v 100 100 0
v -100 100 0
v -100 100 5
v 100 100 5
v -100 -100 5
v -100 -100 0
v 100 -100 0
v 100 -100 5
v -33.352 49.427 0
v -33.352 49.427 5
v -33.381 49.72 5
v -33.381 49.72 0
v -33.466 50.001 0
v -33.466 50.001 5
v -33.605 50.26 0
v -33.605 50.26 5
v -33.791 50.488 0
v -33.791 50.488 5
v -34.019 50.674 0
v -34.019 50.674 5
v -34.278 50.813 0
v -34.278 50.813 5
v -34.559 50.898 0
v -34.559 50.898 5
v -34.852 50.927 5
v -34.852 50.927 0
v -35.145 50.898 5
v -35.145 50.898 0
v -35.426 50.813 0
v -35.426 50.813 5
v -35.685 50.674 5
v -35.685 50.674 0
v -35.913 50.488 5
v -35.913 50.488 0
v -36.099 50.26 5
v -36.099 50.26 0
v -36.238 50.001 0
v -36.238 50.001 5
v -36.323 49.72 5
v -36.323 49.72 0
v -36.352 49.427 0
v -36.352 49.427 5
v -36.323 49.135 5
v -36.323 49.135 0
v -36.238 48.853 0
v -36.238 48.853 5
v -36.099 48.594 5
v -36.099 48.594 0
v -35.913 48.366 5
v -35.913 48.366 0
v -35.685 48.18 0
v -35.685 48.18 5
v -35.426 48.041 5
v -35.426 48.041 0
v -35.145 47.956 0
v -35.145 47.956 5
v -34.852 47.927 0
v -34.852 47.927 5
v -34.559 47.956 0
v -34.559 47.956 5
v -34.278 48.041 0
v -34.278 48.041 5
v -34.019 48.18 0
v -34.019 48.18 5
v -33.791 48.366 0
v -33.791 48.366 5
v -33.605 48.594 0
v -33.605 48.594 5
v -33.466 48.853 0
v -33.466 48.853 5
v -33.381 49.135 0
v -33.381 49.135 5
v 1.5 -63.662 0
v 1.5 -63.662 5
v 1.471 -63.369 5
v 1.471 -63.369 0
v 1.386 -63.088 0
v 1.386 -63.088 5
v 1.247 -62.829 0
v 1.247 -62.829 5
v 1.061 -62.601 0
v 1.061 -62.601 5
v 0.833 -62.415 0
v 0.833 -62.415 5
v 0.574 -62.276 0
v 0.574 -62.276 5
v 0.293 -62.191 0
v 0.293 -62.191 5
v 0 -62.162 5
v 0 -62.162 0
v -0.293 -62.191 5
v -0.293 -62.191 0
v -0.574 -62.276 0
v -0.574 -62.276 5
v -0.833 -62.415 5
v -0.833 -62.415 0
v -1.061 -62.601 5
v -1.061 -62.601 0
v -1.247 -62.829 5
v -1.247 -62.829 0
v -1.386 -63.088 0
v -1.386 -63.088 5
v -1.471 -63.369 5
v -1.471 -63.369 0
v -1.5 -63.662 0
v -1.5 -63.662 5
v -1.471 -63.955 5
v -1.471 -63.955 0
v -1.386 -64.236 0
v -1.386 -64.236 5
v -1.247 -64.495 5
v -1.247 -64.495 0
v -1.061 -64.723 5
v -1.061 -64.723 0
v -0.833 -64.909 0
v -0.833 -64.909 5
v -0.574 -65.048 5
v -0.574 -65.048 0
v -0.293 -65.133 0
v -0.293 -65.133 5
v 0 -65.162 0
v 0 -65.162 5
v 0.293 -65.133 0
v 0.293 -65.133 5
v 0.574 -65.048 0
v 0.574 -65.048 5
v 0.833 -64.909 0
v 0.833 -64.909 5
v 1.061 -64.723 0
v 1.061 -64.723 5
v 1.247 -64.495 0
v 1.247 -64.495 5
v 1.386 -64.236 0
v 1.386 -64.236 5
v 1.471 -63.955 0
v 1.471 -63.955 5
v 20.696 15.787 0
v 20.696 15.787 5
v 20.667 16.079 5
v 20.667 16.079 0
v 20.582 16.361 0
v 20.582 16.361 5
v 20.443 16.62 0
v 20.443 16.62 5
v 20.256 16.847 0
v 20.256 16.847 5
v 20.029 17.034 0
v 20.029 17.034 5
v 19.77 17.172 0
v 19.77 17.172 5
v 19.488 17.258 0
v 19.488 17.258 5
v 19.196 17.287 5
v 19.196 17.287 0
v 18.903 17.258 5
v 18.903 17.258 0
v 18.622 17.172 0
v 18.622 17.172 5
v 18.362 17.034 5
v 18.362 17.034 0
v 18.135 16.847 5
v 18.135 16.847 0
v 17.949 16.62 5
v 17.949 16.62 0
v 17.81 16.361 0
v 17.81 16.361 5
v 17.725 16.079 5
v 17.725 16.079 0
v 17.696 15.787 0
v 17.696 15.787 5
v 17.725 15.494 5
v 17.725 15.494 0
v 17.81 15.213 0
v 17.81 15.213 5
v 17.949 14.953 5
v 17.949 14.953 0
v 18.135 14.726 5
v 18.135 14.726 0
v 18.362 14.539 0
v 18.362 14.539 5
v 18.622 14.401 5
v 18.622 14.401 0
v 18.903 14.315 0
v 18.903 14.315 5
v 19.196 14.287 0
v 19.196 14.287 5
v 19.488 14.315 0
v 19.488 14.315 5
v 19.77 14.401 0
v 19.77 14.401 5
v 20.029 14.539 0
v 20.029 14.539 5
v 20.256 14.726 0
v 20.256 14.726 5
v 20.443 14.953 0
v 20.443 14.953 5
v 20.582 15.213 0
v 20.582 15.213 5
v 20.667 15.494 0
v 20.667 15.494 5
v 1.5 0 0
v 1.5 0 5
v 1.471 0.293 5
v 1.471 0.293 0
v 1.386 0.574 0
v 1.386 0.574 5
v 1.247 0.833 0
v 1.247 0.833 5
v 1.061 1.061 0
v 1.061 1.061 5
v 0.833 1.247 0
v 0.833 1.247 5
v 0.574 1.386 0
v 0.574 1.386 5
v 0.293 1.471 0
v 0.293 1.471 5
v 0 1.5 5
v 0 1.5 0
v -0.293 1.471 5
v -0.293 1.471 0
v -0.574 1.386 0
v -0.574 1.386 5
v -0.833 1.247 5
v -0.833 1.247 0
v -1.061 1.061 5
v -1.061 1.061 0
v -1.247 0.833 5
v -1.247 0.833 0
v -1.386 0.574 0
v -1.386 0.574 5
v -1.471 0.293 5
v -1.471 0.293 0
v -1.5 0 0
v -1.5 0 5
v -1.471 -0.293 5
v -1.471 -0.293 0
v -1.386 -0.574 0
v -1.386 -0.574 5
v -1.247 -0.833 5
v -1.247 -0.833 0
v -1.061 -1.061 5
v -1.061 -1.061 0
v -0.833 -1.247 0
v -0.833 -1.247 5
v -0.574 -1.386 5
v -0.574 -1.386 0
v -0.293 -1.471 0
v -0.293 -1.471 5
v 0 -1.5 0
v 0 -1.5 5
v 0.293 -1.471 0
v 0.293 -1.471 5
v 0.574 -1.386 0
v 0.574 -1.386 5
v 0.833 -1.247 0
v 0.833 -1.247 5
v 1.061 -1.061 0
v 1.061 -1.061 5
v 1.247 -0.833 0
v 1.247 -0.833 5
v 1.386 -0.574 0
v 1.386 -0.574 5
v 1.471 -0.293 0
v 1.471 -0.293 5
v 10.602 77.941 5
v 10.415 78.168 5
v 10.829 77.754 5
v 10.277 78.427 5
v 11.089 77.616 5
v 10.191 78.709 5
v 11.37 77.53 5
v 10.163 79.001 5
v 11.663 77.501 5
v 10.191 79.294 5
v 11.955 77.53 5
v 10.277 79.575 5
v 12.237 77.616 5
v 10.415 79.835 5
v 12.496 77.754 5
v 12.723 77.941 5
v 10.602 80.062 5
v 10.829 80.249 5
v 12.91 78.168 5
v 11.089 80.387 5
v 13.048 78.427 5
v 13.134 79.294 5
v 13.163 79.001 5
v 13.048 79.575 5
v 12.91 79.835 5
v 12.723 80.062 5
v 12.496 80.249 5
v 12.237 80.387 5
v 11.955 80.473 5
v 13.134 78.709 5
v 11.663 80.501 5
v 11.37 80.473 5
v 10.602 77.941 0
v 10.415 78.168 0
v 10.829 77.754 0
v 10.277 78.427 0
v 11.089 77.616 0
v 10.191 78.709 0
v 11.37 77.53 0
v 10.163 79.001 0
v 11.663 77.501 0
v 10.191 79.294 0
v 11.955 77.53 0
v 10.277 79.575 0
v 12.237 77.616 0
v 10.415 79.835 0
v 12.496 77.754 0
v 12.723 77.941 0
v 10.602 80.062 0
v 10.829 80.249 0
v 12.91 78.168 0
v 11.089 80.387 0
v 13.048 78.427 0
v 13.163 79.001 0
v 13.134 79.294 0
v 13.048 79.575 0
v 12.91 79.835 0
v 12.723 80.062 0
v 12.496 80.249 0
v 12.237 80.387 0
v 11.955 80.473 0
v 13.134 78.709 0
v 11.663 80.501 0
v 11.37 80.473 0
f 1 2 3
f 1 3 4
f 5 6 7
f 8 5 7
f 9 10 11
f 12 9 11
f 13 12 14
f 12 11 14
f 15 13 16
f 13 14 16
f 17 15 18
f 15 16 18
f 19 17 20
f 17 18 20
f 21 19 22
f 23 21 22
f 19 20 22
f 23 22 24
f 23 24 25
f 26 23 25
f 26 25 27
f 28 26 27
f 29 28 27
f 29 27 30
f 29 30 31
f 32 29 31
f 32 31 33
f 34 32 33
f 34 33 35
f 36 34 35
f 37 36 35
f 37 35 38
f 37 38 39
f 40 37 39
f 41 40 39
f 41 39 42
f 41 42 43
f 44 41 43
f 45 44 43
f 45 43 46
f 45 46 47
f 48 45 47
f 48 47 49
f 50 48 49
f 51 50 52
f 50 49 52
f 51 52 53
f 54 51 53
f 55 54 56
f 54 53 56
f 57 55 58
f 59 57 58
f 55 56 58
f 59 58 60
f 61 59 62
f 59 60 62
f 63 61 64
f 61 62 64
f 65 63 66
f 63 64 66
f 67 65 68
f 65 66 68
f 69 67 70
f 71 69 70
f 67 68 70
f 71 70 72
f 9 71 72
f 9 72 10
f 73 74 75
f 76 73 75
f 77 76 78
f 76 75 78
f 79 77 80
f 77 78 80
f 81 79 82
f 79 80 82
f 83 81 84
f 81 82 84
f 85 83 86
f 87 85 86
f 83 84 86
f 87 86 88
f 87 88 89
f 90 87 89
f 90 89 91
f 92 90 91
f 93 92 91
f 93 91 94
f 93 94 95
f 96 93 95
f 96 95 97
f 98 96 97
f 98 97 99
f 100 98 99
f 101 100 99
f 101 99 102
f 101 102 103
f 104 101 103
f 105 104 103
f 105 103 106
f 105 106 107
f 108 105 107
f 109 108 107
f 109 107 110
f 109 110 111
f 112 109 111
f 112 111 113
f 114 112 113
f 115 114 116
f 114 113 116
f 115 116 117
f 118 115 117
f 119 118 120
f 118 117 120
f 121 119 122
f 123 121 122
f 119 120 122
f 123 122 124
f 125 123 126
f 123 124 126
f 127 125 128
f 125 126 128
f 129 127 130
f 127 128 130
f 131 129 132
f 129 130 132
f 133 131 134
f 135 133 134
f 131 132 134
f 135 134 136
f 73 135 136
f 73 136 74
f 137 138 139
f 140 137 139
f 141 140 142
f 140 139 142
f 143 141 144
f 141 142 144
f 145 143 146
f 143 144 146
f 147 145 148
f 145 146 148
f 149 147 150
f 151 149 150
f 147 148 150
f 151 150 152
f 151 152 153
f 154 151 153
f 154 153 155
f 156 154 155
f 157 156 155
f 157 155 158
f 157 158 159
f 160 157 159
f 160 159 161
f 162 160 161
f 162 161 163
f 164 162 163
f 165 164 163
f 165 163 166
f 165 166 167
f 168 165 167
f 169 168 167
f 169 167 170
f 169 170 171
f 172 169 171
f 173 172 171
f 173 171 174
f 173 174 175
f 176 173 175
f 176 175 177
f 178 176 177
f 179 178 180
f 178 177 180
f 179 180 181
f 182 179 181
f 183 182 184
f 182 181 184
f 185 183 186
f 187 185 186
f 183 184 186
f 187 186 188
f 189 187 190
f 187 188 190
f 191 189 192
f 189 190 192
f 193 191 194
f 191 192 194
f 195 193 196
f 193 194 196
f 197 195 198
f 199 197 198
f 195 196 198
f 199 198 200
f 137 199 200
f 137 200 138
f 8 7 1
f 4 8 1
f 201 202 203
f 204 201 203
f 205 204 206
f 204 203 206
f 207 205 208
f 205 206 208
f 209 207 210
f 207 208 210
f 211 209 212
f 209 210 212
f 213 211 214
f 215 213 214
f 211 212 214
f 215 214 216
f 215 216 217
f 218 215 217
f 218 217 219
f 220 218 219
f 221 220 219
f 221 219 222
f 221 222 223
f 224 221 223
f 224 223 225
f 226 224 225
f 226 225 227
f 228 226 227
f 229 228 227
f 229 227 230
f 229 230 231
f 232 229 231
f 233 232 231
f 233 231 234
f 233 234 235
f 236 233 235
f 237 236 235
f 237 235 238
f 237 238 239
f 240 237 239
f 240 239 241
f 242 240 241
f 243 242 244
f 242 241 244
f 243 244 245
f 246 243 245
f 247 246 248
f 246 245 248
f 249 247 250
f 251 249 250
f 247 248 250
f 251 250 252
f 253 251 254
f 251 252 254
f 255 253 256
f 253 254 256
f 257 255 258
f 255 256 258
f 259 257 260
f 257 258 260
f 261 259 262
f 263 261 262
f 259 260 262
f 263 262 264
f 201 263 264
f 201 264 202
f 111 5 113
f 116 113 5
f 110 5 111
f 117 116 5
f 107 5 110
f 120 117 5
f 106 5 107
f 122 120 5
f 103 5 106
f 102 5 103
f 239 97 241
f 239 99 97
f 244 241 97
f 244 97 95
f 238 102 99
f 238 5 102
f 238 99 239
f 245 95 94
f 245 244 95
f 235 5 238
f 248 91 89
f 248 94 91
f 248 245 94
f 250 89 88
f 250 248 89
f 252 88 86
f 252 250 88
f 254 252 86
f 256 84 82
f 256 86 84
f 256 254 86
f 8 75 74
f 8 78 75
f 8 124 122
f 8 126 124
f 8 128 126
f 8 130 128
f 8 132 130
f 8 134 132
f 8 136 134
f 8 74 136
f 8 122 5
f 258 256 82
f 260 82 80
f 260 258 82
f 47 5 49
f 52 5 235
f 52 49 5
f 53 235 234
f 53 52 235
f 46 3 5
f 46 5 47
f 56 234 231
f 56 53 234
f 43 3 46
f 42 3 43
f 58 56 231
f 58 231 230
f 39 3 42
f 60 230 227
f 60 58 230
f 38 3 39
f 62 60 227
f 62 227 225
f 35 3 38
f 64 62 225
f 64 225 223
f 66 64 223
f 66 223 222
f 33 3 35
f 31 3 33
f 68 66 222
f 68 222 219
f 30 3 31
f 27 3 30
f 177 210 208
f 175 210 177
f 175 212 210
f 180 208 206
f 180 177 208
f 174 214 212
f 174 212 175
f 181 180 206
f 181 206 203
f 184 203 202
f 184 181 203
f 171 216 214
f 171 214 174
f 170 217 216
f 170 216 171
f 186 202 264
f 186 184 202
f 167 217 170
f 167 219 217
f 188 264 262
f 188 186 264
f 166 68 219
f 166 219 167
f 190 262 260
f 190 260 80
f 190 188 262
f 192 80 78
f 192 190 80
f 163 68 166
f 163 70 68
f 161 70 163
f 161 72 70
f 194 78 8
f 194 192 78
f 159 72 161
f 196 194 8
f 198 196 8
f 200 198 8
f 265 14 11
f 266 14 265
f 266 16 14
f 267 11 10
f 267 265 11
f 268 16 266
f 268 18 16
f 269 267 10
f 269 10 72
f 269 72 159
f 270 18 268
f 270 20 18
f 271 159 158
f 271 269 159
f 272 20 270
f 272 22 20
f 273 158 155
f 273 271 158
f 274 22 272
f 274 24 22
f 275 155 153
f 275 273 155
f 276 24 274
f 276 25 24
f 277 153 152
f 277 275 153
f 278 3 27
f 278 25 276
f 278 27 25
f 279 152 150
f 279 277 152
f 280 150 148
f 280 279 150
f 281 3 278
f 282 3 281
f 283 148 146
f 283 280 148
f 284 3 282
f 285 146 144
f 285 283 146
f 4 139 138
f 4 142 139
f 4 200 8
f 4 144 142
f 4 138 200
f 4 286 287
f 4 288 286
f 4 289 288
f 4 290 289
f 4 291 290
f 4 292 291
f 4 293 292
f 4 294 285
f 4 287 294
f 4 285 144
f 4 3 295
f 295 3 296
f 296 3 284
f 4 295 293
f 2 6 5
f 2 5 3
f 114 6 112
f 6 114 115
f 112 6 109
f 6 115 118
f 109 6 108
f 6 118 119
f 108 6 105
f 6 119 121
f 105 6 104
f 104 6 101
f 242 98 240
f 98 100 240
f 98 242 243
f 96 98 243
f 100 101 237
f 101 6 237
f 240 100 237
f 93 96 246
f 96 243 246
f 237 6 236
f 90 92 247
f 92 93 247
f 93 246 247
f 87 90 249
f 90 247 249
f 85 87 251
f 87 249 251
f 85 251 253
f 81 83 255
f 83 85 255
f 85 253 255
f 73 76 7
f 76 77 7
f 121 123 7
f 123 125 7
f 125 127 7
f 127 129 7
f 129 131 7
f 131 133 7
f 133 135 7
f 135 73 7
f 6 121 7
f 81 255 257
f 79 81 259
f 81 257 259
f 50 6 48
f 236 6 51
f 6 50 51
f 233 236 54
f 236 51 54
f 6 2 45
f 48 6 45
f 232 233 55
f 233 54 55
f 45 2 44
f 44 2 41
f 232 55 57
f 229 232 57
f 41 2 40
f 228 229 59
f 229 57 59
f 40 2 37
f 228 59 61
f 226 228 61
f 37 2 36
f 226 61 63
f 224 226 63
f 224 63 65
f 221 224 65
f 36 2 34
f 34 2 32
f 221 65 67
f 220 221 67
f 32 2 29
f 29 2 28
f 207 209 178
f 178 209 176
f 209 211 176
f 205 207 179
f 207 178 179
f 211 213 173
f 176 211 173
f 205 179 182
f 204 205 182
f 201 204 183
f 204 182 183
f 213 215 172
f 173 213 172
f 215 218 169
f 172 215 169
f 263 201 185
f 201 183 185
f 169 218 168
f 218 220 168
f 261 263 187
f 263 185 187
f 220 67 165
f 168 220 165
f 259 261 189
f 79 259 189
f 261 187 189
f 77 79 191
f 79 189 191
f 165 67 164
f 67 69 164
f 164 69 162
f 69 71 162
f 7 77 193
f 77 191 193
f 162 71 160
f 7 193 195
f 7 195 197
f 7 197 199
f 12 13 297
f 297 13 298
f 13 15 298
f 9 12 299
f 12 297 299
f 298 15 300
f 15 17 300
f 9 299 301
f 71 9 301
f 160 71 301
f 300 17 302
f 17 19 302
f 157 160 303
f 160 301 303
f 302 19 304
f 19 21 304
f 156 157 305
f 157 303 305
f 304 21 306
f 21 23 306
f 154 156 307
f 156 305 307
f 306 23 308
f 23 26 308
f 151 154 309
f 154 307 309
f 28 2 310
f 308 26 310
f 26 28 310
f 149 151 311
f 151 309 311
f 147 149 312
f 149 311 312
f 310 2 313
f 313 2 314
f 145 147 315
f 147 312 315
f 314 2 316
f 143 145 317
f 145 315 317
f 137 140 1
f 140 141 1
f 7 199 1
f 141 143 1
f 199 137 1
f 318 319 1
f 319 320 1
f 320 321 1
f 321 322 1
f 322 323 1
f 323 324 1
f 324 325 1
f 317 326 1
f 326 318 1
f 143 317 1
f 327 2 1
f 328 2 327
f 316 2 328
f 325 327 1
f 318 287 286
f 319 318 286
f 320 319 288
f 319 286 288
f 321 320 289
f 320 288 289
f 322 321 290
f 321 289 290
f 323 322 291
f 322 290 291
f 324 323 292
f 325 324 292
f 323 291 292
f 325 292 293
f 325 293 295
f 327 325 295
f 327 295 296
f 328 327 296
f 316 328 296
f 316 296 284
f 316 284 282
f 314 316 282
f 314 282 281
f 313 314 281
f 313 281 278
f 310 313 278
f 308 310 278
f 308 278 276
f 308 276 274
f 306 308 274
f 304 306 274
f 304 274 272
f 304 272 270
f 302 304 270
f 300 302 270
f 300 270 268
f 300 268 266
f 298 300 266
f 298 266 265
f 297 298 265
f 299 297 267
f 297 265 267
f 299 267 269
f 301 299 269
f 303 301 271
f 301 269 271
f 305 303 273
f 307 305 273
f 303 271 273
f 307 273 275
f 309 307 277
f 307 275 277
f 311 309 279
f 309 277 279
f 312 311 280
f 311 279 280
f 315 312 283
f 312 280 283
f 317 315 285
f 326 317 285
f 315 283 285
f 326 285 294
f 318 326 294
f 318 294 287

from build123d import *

# Parameters (mm, degrees)
F0_W     = 200
F0_H     = 200
F1_DEPTH = 5
F2_R     = 1.5
F3_DEPTH = 5.001


with BuildPart() as f1:
    # F0 (on Top) → F1 (new body)
    with BuildSketch(Plane.XY):
        Rectangle(F0_W, F0_H)
    extrude(amount=F1_DEPTH)

    # F2 (on face) → F3 (cut, through all)
    with BuildSketch(Plane.XY.offset(5)):
        Circle(F2_R)
        with Locations((0, -63.662)):
            Circle(F2_R)
        with Locations((11.662546, 79.001375)):
            Circle(F2_R)
        with Locations((-34.852075, 49.427142)):
            Circle(F2_R)
        with Locations((19.195754, 15.786653)):
            Circle(F2_R)
    extrude(amount=-F3_DEPTH, mode=Mode.SUBTRACT)


solid = f1.part
